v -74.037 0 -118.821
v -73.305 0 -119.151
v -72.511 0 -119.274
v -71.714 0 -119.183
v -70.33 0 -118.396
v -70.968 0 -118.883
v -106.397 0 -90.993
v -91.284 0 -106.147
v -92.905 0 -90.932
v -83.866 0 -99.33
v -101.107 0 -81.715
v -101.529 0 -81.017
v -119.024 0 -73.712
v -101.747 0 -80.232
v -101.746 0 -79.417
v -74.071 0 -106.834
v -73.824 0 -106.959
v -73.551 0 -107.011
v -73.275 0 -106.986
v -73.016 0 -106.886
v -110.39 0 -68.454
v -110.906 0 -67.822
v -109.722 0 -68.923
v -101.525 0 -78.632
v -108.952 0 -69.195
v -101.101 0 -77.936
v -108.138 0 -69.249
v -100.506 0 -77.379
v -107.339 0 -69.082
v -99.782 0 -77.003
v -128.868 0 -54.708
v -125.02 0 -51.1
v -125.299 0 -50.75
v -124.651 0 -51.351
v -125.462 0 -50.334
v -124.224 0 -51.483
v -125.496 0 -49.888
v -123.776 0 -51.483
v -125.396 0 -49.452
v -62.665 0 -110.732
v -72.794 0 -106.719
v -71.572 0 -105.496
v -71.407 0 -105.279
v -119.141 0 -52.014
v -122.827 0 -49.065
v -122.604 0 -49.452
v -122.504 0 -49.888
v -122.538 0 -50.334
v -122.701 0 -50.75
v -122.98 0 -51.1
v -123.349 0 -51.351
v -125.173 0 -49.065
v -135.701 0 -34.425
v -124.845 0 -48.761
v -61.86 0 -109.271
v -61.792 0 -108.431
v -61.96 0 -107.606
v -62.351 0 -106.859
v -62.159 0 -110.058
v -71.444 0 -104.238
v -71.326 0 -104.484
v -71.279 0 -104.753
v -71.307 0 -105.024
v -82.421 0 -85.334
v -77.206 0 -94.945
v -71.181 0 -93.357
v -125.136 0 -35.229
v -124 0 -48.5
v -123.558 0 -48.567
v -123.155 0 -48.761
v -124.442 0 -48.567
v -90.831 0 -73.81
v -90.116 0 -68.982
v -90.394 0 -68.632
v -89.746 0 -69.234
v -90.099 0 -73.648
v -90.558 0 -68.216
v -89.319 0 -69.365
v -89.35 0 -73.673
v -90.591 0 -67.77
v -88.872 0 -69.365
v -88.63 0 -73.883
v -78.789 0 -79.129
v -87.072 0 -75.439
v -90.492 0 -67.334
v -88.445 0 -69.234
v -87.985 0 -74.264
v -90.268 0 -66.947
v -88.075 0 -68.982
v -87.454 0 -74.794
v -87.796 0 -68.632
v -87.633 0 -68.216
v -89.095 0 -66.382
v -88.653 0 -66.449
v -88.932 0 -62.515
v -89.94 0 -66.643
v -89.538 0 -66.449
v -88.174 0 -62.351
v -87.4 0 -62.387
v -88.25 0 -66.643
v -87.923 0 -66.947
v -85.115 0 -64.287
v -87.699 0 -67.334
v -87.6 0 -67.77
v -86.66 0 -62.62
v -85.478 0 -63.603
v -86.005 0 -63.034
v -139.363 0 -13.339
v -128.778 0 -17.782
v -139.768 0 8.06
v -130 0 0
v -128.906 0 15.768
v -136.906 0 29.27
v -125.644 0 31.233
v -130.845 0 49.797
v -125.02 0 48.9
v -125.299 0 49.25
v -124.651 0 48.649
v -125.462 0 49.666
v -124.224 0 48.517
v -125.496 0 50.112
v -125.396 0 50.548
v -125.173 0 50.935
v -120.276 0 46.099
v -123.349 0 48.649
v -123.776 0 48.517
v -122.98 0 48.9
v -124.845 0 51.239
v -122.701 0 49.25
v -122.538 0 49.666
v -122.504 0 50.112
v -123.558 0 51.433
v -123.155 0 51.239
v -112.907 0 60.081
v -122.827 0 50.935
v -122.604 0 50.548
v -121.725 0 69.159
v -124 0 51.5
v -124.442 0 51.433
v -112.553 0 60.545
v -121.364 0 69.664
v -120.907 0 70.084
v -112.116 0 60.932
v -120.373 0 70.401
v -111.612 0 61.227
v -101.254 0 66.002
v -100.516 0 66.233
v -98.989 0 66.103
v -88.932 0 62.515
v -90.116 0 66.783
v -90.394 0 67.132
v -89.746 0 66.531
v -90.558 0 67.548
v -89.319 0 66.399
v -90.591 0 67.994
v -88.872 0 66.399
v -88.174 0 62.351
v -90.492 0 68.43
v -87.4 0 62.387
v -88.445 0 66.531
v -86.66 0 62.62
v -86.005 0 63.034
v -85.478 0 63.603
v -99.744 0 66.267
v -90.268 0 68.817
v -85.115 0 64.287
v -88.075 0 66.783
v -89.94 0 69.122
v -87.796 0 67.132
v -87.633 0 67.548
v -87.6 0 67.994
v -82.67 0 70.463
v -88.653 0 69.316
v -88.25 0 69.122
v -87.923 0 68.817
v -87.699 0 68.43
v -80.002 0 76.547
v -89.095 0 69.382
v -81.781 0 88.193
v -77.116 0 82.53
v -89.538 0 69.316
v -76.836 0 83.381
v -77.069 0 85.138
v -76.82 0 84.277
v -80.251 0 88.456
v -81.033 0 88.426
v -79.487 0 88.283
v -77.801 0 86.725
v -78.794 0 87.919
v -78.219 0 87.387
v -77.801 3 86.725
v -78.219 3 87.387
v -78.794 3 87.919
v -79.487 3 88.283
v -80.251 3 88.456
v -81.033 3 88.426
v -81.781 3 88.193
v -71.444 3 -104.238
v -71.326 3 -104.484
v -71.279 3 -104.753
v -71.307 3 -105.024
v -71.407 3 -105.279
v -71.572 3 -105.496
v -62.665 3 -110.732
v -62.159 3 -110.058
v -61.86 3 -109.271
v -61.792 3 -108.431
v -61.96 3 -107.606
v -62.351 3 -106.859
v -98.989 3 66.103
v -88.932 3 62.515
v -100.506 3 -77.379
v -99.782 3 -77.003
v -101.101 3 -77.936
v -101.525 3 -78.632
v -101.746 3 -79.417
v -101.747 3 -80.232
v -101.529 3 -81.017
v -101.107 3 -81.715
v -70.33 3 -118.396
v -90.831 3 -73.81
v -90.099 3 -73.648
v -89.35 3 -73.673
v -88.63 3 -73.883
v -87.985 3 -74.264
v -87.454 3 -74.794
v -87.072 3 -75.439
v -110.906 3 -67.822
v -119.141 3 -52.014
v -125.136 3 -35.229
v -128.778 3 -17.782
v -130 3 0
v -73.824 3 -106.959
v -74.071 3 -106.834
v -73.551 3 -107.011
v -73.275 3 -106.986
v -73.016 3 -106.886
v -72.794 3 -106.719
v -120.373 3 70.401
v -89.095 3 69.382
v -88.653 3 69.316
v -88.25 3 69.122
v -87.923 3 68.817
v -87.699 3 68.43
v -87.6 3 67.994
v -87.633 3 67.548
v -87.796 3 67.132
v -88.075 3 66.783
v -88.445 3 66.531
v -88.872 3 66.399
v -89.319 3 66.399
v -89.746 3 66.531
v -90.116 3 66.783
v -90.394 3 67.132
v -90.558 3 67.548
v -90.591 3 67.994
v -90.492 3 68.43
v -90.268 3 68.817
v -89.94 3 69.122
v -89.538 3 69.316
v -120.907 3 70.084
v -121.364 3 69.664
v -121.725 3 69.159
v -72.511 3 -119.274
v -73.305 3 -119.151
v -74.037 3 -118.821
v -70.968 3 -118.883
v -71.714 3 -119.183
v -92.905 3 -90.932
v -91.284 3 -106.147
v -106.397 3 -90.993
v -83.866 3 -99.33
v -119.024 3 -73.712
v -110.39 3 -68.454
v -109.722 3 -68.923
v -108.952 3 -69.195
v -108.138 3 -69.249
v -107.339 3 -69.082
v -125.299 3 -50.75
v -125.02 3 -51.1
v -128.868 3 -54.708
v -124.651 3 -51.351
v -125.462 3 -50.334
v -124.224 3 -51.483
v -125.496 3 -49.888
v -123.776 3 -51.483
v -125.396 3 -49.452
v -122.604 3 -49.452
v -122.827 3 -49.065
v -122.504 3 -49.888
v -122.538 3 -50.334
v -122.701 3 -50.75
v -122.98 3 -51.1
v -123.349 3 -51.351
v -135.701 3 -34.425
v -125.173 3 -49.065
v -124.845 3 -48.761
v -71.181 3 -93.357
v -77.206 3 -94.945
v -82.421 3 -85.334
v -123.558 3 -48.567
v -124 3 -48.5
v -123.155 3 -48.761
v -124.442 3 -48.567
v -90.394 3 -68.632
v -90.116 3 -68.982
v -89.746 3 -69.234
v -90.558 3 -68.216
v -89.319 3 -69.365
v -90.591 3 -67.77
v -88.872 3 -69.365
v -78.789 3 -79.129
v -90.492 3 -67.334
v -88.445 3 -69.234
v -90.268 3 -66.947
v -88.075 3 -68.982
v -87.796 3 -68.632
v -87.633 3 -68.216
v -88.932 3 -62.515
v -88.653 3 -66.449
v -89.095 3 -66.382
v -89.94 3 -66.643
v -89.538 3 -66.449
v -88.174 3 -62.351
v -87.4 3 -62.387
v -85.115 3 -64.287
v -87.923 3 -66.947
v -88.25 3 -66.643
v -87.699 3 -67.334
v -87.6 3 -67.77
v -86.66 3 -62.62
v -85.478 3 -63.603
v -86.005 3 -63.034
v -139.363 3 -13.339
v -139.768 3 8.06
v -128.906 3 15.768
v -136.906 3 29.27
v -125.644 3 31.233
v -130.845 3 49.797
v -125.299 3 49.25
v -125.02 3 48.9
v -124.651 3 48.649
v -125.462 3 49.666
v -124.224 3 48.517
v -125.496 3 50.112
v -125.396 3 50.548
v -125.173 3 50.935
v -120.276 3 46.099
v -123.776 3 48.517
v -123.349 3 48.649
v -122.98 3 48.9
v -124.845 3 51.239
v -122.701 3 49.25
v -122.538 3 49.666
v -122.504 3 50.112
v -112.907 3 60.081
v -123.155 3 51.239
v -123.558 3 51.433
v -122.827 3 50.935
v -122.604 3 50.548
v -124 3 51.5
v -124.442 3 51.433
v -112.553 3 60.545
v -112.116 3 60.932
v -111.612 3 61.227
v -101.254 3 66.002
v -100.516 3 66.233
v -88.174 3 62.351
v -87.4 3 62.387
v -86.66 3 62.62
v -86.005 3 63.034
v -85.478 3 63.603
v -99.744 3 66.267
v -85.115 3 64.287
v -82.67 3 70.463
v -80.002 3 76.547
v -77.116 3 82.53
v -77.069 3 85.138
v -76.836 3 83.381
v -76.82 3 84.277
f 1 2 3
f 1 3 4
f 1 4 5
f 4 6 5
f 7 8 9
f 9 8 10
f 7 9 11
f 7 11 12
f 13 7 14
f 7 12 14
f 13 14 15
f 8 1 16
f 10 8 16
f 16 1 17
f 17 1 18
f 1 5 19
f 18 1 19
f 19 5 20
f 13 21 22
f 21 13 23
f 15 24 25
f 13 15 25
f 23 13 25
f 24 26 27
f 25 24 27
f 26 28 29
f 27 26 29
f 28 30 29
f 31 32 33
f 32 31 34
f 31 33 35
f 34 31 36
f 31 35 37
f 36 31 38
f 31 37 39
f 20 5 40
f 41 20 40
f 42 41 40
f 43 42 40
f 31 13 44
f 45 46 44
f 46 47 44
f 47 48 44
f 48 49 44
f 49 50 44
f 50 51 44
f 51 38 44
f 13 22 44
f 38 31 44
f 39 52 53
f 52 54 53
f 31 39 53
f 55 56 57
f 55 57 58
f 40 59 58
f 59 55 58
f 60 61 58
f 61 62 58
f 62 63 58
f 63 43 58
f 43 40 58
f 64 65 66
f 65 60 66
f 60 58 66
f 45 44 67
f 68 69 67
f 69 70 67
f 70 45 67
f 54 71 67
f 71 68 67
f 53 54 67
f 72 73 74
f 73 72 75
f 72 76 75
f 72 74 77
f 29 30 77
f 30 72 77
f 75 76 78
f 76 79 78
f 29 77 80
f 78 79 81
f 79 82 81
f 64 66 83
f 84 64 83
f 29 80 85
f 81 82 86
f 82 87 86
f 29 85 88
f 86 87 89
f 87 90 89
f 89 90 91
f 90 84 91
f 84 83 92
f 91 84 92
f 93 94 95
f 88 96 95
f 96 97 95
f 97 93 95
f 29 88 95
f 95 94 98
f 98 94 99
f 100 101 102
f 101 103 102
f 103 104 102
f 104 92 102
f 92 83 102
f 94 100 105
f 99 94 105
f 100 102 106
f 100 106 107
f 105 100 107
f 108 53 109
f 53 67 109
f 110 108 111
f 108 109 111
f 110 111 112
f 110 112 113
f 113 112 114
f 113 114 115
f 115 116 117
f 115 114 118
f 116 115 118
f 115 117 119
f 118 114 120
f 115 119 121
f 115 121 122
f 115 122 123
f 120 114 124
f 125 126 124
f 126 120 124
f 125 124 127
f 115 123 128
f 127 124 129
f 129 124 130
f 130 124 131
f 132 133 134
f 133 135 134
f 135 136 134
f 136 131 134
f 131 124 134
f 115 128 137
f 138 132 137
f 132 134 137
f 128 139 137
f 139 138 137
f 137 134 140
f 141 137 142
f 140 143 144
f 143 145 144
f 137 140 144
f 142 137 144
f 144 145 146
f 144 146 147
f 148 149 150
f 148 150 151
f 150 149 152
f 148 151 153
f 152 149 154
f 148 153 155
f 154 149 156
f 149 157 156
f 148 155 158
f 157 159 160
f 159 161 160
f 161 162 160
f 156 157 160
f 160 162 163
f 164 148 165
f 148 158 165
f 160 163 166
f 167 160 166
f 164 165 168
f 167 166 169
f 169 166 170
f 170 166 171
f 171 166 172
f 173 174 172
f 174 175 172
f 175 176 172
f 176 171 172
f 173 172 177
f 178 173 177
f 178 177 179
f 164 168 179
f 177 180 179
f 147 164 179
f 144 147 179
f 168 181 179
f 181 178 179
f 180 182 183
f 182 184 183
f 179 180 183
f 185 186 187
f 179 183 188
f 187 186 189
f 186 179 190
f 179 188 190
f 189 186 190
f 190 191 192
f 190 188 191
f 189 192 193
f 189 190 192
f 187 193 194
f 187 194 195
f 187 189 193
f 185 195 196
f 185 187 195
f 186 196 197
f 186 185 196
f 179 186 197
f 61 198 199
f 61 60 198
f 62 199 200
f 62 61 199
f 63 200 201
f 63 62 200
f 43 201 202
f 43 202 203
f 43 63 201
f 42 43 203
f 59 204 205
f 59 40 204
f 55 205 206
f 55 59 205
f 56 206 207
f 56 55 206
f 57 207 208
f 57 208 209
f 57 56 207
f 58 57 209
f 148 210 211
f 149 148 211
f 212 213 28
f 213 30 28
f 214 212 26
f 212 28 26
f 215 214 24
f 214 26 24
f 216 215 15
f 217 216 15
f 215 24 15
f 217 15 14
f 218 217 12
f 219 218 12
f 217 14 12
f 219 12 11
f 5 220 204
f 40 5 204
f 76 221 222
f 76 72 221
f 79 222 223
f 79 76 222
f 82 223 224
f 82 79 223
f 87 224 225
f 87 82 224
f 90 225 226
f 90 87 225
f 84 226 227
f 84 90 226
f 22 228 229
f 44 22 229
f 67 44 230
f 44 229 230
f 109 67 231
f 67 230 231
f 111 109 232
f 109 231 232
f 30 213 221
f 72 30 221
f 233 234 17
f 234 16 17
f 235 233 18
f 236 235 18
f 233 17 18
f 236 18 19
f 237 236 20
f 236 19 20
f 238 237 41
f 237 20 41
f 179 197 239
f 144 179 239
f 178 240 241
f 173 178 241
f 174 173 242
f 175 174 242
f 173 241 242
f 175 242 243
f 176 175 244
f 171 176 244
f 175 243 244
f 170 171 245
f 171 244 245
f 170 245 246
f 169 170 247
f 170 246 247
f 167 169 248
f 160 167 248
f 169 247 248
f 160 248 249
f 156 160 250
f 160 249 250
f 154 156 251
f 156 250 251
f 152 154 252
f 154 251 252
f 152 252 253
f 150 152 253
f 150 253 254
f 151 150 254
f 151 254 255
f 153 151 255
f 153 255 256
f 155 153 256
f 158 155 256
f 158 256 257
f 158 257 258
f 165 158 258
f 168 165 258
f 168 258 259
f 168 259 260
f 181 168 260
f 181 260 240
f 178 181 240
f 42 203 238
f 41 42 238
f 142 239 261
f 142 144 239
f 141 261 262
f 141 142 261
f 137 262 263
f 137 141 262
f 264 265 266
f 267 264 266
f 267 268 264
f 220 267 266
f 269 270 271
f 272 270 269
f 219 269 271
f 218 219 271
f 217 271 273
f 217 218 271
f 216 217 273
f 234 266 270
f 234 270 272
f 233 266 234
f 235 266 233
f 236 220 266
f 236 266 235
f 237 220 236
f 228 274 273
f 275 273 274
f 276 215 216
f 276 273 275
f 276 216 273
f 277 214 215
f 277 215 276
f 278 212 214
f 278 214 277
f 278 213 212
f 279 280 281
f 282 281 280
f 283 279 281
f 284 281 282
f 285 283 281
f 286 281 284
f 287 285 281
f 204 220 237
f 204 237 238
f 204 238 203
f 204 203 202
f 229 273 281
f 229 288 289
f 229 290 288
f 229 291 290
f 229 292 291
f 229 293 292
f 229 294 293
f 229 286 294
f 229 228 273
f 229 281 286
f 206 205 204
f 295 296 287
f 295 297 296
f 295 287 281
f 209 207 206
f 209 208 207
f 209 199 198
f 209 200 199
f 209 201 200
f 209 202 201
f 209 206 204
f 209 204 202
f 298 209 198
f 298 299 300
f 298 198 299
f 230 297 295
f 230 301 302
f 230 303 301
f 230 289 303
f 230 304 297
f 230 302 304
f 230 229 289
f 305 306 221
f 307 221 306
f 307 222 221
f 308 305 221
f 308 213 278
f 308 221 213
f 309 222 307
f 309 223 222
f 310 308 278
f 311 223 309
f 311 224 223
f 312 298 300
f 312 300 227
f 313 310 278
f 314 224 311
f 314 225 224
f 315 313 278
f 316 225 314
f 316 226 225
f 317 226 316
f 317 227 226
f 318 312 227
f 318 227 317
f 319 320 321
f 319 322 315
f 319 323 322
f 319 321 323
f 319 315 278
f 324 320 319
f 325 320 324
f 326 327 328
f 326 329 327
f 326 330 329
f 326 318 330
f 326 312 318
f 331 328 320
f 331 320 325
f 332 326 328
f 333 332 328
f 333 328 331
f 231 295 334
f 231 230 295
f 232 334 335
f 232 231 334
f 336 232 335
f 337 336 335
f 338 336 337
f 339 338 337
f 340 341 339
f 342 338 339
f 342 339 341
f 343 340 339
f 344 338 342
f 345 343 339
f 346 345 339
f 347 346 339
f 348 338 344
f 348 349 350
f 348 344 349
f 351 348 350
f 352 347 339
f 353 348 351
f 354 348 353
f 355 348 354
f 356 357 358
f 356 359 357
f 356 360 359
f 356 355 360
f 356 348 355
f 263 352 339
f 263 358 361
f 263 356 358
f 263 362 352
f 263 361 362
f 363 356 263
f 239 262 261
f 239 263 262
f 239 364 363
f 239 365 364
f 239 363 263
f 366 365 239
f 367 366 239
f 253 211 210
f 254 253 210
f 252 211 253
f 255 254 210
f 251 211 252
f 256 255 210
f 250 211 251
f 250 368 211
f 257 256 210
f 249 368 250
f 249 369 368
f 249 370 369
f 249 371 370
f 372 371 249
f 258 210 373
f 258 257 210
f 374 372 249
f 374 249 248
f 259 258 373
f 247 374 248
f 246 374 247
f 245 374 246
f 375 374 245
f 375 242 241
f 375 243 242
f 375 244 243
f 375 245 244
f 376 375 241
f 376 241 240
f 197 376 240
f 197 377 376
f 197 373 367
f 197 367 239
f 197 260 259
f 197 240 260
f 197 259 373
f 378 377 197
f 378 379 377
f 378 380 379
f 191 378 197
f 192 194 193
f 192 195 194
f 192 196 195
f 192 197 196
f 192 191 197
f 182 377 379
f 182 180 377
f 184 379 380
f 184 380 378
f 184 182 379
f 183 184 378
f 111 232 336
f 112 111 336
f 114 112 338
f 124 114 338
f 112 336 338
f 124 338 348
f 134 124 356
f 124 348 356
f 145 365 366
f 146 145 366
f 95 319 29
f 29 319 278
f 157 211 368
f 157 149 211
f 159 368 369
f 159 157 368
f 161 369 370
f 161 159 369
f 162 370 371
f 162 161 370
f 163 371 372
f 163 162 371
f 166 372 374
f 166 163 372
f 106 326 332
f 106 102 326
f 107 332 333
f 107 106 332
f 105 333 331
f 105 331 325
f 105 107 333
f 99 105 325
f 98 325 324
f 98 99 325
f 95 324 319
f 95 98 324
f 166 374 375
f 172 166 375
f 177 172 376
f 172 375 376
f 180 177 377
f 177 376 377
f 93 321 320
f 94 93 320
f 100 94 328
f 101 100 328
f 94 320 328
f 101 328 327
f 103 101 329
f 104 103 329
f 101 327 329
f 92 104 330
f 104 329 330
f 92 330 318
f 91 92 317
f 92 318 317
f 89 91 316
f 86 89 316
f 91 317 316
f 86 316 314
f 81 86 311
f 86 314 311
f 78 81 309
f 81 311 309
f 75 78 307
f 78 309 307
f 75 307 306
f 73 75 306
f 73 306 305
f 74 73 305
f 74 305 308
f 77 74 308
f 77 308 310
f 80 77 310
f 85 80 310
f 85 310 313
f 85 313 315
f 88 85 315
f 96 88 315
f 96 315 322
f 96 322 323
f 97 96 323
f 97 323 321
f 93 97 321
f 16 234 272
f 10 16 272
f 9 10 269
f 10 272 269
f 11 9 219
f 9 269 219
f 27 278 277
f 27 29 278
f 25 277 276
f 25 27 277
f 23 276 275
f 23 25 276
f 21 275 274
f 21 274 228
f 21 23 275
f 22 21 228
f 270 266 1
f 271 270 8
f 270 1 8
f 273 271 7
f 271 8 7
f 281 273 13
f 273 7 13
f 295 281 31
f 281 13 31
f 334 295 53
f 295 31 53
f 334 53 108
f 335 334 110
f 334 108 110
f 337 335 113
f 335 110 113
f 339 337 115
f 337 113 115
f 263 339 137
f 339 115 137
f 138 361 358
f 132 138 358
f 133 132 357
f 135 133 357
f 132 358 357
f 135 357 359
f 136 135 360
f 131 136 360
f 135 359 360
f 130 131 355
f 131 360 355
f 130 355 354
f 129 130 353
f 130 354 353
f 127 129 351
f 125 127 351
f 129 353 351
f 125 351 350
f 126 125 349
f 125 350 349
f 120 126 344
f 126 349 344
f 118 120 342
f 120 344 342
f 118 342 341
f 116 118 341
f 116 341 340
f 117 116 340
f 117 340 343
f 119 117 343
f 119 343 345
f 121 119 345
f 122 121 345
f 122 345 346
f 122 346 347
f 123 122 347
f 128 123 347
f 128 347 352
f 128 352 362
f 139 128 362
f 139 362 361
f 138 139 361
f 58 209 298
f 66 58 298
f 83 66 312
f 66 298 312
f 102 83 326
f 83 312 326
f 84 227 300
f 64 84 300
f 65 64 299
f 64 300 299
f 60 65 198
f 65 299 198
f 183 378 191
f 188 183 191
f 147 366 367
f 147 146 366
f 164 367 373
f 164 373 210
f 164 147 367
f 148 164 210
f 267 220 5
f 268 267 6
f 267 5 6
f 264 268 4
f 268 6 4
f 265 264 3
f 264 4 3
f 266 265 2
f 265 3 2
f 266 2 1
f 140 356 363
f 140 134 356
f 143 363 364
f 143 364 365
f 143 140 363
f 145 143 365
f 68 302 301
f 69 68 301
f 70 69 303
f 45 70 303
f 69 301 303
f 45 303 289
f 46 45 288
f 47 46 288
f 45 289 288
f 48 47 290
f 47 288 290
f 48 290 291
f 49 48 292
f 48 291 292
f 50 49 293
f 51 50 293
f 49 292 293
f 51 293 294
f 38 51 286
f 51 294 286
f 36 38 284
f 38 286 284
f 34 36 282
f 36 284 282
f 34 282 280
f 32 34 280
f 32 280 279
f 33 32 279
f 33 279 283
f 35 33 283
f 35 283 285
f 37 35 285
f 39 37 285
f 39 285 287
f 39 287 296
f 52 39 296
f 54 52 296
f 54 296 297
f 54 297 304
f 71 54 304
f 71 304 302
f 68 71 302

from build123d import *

# Parameters (mm, degrees)
SKETCH1_R           = 140
BOSS_EXTRUDE1_DEPTH = 3
CUT_EXTRUDE3_REACH  = 200.013
SKETCH19_R          = 1.5
CUT_EXTRUDE10_REACH = 200.013
SKETCH25_R          = 1.5
CUT_EXTRUDE4_REACH  = 200.013
FILLET2_R           = 10
SKETCH26_R          = 1.5
CUT_EXTRUDE11_DEPTH = 3
FILLET6_R           = 3
FILLET7_R           = 1


with BuildPart() as part:
    # Sketch1 → Boss-Extrude1 (new body)
    with BuildSketch(Plane(origin=(0, 0, 0), x_dir=(1, 0, 0), z_dir=(0, 1, 0))):
        with Locations(Location((0, 0, 0), (0, 0, 270))):
            Circle(SKETCH1_R)
    extrude(amount=BOSS_EXTRUDE1_DEPTH)

    # Sketch19 → Cut-Extrude3 (cut, up to next)
    with BuildSketch(Plane(origin=(0, 3, 0), x_dir=(1, 0, 0), z_dir=(0, 1, 0)), mode=Mode.PRIVATE) as cut_extrude3_sk1:
        with Locations(Location((-89.09545443, -67.882250994, 0), (0, 0, 270))):
            Circle(SKETCH19_R)
    cut_extrude3_tool1 = extrude(cut_extrude3_sk1.sketch, amount=-CUT_EXTRUDE3_REACH, mode=Mode.PRIVATE) & part.part
    # Sketch19 → Cut-Extrude3 (cut, up to next)
    with BuildSketch(Plane(origin=(0, 3, 0), x_dir=(1, 0, 0), z_dir=(0, 1, 0)), mode=Mode.PRIVATE) as cut_extrude3_sk2:
        with Locations(Location((-89.09545443, 67.882250994, 0), (0, 0, 270))):
            Circle(SKETCH19_R)
    cut_extrude3_tool2 = extrude(cut_extrude3_sk2.sketch, amount=-CUT_EXTRUDE3_REACH, mode=Mode.PRIVATE) & part.part
    # Sketch19 → Cut-Extrude3 (cut, up to next)
    with BuildSketch(Plane(origin=(0, 3, 0), x_dir=(1, 0, 0), z_dir=(0, 1, 0)), mode=Mode.PRIVATE) as cut_extrude3_sk3:
        with Locations(Location((89.09545443, 67.882250994, 0), (0, 0, 270))):
            Circle(SKETCH19_R)
    cut_extrude3_tool3 = extrude(cut_extrude3_sk3.sketch, amount=-CUT_EXTRUDE3_REACH, mode=Mode.PRIVATE) & part.part
    # Sketch19 → Cut-Extrude3 (cut, up to next)
    with BuildSketch(Plane(origin=(0, 3, 0), x_dir=(1, 0, 0), z_dir=(0, 1, 0)), mode=Mode.PRIVATE) as cut_extrude3_sk4:
        with Locations(Location((89.09545443, -67.882250994, 0), (0, 0, 270))):
            Circle(SKETCH19_R)
    cut_extrude3_tool4 = extrude(cut_extrude3_sk4.sketch, amount=-CUT_EXTRUDE3_REACH, mode=Mode.PRIVATE) & part.part
    # Sketch19 → Cut-Extrude3 (cut, up to next)
    with BuildSketch(Plane(origin=(0, 3, 0), x_dir=(1, 0, 0), z_dir=(0, 1, 0)), mode=Mode.PRIVATE) as cut_extrude3_sk5:
        with Locations(Location((-67.882250994, 89.09545443, 0), (0, 0, 270))):
            Circle(SKETCH19_R)
    cut_extrude3_tool5 = extrude(cut_extrude3_sk5.sketch, amount=-CUT_EXTRUDE3_REACH, mode=Mode.PRIVATE) & part.part
    # Sketch19 → Cut-Extrude3 (cut, up to next)
    with BuildSketch(Plane(origin=(0, 3, 0), x_dir=(1, 0, 0), z_dir=(0, 1, 0)), mode=Mode.PRIVATE) as cut_extrude3_sk6:
        with Locations(Location((67.882250994, 89.09545443, 0), (0, 0, 270))):
            Circle(SKETCH19_R)
    cut_extrude3_tool6 = extrude(cut_extrude3_sk6.sketch, amount=-CUT_EXTRUDE3_REACH, mode=Mode.PRIVATE) & part.part
    # Sketch19 → Cut-Extrude3 (cut, up to next)
    with BuildSketch(Plane(origin=(0, 3, 0), x_dir=(1, 0, 0), z_dir=(0, 1, 0)), mode=Mode.PRIVATE) as cut_extrude3_sk7:
        with Locations(Location((67.882250994, -89.09545443, 0), (0, 0, 270))):
            Circle(SKETCH19_R)
    cut_extrude3_tool7 = extrude(cut_extrude3_sk7.sketch, amount=-CUT_EXTRUDE3_REACH, mode=Mode.PRIVATE) & part.part
    # Sketch19 → Cut-Extrude3 (cut, up to next)
    with BuildSketch(Plane(origin=(0, 3, 0), x_dir=(1, 0, 0), z_dir=(0, 1, 0)), mode=Mode.PRIVATE) as cut_extrude3_sk8:
        with Locations(Location((-67.882250994, -89.09545443, 0), (0, 0, 270))):
            Circle(SKETCH19_R)
    cut_extrude3_tool8 = extrude(cut_extrude3_sk8.sketch, amount=-CUT_EXTRUDE3_REACH, mode=Mode.PRIVATE) & part.part
    add(cut_extrude3_tool1.solids().sort_by_distance((-89.095454, 3, 67.882251))[0], mode=Mode.SUBTRACT)
    add(cut_extrude3_tool2.solids().sort_by_distance((-89.095454, 3, -67.882251))[0], mode=Mode.SUBTRACT)
    add(cut_extrude3_tool3.solids().sort_by_distance((89.095454, 3, -67.882251))[0], mode=Mode.SUBTRACT)
    add(cut_extrude3_tool4.solids().sort_by_distance((89.095454, 3, 67.882251))[0], mode=Mode.SUBTRACT)
    add(cut_extrude3_tool5.solids().sort_by_distance((-67.882251, 3, -89.095454))[0], mode=Mode.SUBTRACT)
    add(cut_extrude3_tool6.solids().sort_by_distance((67.882251, 3, -89.095454))[0], mode=Mode.SUBTRACT)
    add(cut_extrude3_tool7.solids().sort_by_distance((67.882251, 3, 89.095454))[0], mode=Mode.SUBTRACT)
    add(cut_extrude3_tool8.solids().sort_by_distance((-67.882251, 3, 89.095454))[0], mode=Mode.SUBTRACT)

    # Sketch25 → Cut-Extrude10 (cut, up to next)
    with BuildSketch(Plane(origin=(0, 3, 0), x_dir=(1, 0, 0), z_dir=(0, 1, 0)), mode=Mode.PRIVATE) as cut_extrude10_sk1:
        with Locations(Location((-124, 50, 0), (0, 0, 270))):
            Circle(SKETCH25_R)
    cut_extrude10_tool1 = extrude(cut_extrude10_sk1.sketch, amount=-CUT_EXTRUDE10_REACH, mode=Mode.PRIVATE) & part.part
    # Sketch25 → Cut-Extrude10 (cut, up to next)
    with BuildSketch(Plane(origin=(0, 3, 0), x_dir=(1, 0, 0), z_dir=(0, 1, 0)), mode=Mode.PRIVATE) as cut_extrude10_sk2:
        with Locations(Location((-124, -50, 0), (0, 0, 270))):
            Circle(SKETCH25_R)
    cut_extrude10_tool2 = extrude(cut_extrude10_sk2.sketch, amount=-CUT_EXTRUDE10_REACH, mode=Mode.PRIVATE) & part.part
    add(cut_extrude10_tool1.solids().sort_by_distance((-124, 3, -50))[0], mode=Mode.SUBTRACT)
    add(cut_extrude10_tool2.solids().sort_by_distance((-124, 3, 50))[0], mode=Mode.SUBTRACT)

    # Sketch20 → Cut-Extrude4 (cut, up to next)
    with BuildSketch(Plane(origin=(0, 3, 0), x_dir=(1, 0, 0), z_dir=(0, 1, 0)), mode=Mode.PRIVATE) as cut_extrude4_sk1:
        Polygon((-553.578520829, 601.645168987), (-72, 120.066648158), (-50, 98.066648158), (50, 98.066648158), (72, 120.066648158), (553.578520829, 601.645168987), (553.578520829, 1963.754919995), (-553.578520829, 1963.754919995), align=None)
    cut_extrude4_tool1 = extrude(cut_extrude4_sk1.sketch, amount=-CUT_EXTRUDE4_REACH, mode=Mode.PRIVATE) & part.part
    add(cut_extrude4_tool1.solids().sort_by_distance((0, 3, -1137.970098))[0], mode=Mode.SUBTRACT)

    # Fillet2
    fillet2_edges = [part.edges().sort_by_distance(p)[0] for p in [
        (50, 1.5, -98.066648158),
        (-50, 1.5, -98.066648158),
    ]]
    fillet(fillet2_edges, radius=FILLET2_R)

    # Sketch26 → Cut-Extrude11 (cut)
    # profile 1 of 7: a face of its own
    with BuildSketch(Plane(origin=(0, 3, 0), x_dir=(1, 0, 0), z_dir=(0, 1, 0))):
        with BuildLine():
            Line((-79.056988797, -89.449340058), (-121.24355653, -70))
            ThreePointArc((-121.24355653, -70), (98.171098855, -99.812000028), (72, 120.066648158))
            Line((72, 120.066648158), (52.928932188, 100.995580347))
            ThreePointArc((52.928932188, 100.995580347), (49.6846987, 98.827852833), (45.857864376, 98.066648158))
            Line((45.857864376, 98.066648158), (-45.857864376, 98.066648158))
            ThreePointArc((-45.857864376, 98.066648158), (-49.6846987, 98.827852833), (-52.928932188, 100.995580347))
            Line((-52.928932188, 100.995580347), (-60.850013122, 108.91666128))
            ThreePointArc((-60.850013122, 108.91666128), (-75.23752201, 86.148205434), (-86.128818141, 61.515246573))
            Line((-86.128818141, 61.515246573), (-109.612709786, 69.893160276))
            ThreePointArc((-109.612709786, 69.893160276), (-124.799143171, 36.402937572), (-130, 0))
            ThreePointArc((-130, 0), (-125.518409602, -31.669231283), (-112.425579752, -60.851463362))
            Line((-112.425579752, -60.851463362), (-100.142136058, -66.514518839))
            Line((-100.142136058, -66.514518839), (-86.128818141, -61.515246573))
            ThreePointArc((-86.128818141, -61.515246573), (-81.664833416, -72.826250762), (-76.459826151, -83.815967535))
            Line((-76.459826151, -83.815967535), (-79.056988797, -89.449340058))
        make_face()
        with Locations((-67.882250994, -89.09545443)):
            Circle(SKETCH26_R, mode=Mode.SUBTRACT)
        with Locations((67.882250994, -89.09545443)):
            Circle(SKETCH26_R, mode=Mode.SUBTRACT)
        with Locations((89.09545443, -67.882250994)):
            Circle(SKETCH26_R, mode=Mode.SUBTRACT)
        with Locations((-67.882250994, 89.09545443)):
            Circle(SKETCH26_R, mode=Mode.SUBTRACT)
        with Locations((67.882250994, 89.09545443)):
            Circle(SKETCH26_R, mode=Mode.SUBTRACT)
        with Locations((89.09545443, 67.882250994)):
            Circle(SKETCH26_R, mode=Mode.SUBTRACT)
    # profile 2 of 7: a face of its own
    with BuildSketch(Plane(origin=(0, 3, 0), x_dir=(1, 0, 0), z_dir=(0, 1, 0))):
        with BuildLine():
            Line((-103.69839741, 78.400525346), (-88.170631715, 72.860971556))
            ThreePointArc((-88.170631715, 72.860971556), (-80.354415694, 89.303260425), (-70.993089828, 104.917602363))
            Line((-70.993089828, 104.917602363), (-73.383091495, 107.30760403))
            ThreePointArc((-73.383091495, 107.30760403), (-89.712698252, 94.083110983), (-103.69839741, 78.400525346))
        make_face()
    # profile 3 of 7: a face of its own
    with BuildSketch(Plane(origin=(0, 3, 0), x_dir=(1, 0, 0), z_dir=(0, 1, 0))):
        with Locations((-67.882250994, 89.09545443)):
            Circle(SKETCH26_R)
    # profile 4 of 7: a face of its own
    with BuildSketch(Plane(origin=(0, 3, 0), x_dir=(1, 0, 0), z_dir=(0, 1, 0))):
        with Locations(Location((-89.09545443, 67.882250994, 0), (0, 0, 270))):
            Circle(SKETCH26_R)
    # profile 5 of 7: a face of its own
    with BuildSketch(Plane(origin=(0, 3, 0), x_dir=(1, 0, 0), z_dir=(0, 1, 0))):
        with Locations(Location((-124, 50, 0), (0, 0, 270))):
            Circle(SKETCH26_R)
    # profile 6 of 7: a face of its own
    with BuildSketch(Plane(origin=(0, 3, 0), x_dir=(1, 0, 0), z_dir=(0, 1, 0))):
        with Locations(Location((-89.09545443, -67.882250994, 0), (0, 0, 270))):
            Circle(SKETCH26_R)
    # profile 7 of 7: a face of its own
    with BuildSketch(Plane(origin=(0, 3, 0), x_dir=(1, 0, 0), z_dir=(0, 1, 0))):
        with Locations(Location((-124, -50, 0), (0, 0, 270))):
            Circle(SKETCH26_R)
    extrude(amount=-CUT_EXTRUDE11_DEPTH, mode=Mode.SUBTRACT)

    # Fillet6
    fillet6_edges = [part.edges().sort_by_distance(p)[0] for p in [
        (-109.612709786, 1.5, -69.893160276),
        (-86.128818141, 1.5, -61.515246573),
        (-60.850013122, 1.5, -108.91666128),
        (-121.24355653, 1.5, 70),
        (-79.056988797, 1.5, 89.449340058),
        (-76.459826151, 1.5, 83.815967535),
        (-86.128818141, 1.5, 61.515246573),
        (-100.142136058, 1.5, 66.514518839),
        (-112.425579752, 1.5, 60.851463362),
        (-72, 1.5, -120.066648158),
        (-88.170631715, 1.5, -72.860971556),
        (-103.69839741, 1.5, -78.400525346),
    ]]
    fillet(fillet6_edges, radius=FILLET6_R)

    # Fillet7
    fillet7_edges = [part.edges().sort_by_distance(p)[0] for p in [
        (-73.383091495, 1.5, -107.30760403),
        (-70.993089828, 1.5, -104.917602363),
    ]]
    fillet(fillet7_edges, radius=FILLET7_R)


solid = part.part
